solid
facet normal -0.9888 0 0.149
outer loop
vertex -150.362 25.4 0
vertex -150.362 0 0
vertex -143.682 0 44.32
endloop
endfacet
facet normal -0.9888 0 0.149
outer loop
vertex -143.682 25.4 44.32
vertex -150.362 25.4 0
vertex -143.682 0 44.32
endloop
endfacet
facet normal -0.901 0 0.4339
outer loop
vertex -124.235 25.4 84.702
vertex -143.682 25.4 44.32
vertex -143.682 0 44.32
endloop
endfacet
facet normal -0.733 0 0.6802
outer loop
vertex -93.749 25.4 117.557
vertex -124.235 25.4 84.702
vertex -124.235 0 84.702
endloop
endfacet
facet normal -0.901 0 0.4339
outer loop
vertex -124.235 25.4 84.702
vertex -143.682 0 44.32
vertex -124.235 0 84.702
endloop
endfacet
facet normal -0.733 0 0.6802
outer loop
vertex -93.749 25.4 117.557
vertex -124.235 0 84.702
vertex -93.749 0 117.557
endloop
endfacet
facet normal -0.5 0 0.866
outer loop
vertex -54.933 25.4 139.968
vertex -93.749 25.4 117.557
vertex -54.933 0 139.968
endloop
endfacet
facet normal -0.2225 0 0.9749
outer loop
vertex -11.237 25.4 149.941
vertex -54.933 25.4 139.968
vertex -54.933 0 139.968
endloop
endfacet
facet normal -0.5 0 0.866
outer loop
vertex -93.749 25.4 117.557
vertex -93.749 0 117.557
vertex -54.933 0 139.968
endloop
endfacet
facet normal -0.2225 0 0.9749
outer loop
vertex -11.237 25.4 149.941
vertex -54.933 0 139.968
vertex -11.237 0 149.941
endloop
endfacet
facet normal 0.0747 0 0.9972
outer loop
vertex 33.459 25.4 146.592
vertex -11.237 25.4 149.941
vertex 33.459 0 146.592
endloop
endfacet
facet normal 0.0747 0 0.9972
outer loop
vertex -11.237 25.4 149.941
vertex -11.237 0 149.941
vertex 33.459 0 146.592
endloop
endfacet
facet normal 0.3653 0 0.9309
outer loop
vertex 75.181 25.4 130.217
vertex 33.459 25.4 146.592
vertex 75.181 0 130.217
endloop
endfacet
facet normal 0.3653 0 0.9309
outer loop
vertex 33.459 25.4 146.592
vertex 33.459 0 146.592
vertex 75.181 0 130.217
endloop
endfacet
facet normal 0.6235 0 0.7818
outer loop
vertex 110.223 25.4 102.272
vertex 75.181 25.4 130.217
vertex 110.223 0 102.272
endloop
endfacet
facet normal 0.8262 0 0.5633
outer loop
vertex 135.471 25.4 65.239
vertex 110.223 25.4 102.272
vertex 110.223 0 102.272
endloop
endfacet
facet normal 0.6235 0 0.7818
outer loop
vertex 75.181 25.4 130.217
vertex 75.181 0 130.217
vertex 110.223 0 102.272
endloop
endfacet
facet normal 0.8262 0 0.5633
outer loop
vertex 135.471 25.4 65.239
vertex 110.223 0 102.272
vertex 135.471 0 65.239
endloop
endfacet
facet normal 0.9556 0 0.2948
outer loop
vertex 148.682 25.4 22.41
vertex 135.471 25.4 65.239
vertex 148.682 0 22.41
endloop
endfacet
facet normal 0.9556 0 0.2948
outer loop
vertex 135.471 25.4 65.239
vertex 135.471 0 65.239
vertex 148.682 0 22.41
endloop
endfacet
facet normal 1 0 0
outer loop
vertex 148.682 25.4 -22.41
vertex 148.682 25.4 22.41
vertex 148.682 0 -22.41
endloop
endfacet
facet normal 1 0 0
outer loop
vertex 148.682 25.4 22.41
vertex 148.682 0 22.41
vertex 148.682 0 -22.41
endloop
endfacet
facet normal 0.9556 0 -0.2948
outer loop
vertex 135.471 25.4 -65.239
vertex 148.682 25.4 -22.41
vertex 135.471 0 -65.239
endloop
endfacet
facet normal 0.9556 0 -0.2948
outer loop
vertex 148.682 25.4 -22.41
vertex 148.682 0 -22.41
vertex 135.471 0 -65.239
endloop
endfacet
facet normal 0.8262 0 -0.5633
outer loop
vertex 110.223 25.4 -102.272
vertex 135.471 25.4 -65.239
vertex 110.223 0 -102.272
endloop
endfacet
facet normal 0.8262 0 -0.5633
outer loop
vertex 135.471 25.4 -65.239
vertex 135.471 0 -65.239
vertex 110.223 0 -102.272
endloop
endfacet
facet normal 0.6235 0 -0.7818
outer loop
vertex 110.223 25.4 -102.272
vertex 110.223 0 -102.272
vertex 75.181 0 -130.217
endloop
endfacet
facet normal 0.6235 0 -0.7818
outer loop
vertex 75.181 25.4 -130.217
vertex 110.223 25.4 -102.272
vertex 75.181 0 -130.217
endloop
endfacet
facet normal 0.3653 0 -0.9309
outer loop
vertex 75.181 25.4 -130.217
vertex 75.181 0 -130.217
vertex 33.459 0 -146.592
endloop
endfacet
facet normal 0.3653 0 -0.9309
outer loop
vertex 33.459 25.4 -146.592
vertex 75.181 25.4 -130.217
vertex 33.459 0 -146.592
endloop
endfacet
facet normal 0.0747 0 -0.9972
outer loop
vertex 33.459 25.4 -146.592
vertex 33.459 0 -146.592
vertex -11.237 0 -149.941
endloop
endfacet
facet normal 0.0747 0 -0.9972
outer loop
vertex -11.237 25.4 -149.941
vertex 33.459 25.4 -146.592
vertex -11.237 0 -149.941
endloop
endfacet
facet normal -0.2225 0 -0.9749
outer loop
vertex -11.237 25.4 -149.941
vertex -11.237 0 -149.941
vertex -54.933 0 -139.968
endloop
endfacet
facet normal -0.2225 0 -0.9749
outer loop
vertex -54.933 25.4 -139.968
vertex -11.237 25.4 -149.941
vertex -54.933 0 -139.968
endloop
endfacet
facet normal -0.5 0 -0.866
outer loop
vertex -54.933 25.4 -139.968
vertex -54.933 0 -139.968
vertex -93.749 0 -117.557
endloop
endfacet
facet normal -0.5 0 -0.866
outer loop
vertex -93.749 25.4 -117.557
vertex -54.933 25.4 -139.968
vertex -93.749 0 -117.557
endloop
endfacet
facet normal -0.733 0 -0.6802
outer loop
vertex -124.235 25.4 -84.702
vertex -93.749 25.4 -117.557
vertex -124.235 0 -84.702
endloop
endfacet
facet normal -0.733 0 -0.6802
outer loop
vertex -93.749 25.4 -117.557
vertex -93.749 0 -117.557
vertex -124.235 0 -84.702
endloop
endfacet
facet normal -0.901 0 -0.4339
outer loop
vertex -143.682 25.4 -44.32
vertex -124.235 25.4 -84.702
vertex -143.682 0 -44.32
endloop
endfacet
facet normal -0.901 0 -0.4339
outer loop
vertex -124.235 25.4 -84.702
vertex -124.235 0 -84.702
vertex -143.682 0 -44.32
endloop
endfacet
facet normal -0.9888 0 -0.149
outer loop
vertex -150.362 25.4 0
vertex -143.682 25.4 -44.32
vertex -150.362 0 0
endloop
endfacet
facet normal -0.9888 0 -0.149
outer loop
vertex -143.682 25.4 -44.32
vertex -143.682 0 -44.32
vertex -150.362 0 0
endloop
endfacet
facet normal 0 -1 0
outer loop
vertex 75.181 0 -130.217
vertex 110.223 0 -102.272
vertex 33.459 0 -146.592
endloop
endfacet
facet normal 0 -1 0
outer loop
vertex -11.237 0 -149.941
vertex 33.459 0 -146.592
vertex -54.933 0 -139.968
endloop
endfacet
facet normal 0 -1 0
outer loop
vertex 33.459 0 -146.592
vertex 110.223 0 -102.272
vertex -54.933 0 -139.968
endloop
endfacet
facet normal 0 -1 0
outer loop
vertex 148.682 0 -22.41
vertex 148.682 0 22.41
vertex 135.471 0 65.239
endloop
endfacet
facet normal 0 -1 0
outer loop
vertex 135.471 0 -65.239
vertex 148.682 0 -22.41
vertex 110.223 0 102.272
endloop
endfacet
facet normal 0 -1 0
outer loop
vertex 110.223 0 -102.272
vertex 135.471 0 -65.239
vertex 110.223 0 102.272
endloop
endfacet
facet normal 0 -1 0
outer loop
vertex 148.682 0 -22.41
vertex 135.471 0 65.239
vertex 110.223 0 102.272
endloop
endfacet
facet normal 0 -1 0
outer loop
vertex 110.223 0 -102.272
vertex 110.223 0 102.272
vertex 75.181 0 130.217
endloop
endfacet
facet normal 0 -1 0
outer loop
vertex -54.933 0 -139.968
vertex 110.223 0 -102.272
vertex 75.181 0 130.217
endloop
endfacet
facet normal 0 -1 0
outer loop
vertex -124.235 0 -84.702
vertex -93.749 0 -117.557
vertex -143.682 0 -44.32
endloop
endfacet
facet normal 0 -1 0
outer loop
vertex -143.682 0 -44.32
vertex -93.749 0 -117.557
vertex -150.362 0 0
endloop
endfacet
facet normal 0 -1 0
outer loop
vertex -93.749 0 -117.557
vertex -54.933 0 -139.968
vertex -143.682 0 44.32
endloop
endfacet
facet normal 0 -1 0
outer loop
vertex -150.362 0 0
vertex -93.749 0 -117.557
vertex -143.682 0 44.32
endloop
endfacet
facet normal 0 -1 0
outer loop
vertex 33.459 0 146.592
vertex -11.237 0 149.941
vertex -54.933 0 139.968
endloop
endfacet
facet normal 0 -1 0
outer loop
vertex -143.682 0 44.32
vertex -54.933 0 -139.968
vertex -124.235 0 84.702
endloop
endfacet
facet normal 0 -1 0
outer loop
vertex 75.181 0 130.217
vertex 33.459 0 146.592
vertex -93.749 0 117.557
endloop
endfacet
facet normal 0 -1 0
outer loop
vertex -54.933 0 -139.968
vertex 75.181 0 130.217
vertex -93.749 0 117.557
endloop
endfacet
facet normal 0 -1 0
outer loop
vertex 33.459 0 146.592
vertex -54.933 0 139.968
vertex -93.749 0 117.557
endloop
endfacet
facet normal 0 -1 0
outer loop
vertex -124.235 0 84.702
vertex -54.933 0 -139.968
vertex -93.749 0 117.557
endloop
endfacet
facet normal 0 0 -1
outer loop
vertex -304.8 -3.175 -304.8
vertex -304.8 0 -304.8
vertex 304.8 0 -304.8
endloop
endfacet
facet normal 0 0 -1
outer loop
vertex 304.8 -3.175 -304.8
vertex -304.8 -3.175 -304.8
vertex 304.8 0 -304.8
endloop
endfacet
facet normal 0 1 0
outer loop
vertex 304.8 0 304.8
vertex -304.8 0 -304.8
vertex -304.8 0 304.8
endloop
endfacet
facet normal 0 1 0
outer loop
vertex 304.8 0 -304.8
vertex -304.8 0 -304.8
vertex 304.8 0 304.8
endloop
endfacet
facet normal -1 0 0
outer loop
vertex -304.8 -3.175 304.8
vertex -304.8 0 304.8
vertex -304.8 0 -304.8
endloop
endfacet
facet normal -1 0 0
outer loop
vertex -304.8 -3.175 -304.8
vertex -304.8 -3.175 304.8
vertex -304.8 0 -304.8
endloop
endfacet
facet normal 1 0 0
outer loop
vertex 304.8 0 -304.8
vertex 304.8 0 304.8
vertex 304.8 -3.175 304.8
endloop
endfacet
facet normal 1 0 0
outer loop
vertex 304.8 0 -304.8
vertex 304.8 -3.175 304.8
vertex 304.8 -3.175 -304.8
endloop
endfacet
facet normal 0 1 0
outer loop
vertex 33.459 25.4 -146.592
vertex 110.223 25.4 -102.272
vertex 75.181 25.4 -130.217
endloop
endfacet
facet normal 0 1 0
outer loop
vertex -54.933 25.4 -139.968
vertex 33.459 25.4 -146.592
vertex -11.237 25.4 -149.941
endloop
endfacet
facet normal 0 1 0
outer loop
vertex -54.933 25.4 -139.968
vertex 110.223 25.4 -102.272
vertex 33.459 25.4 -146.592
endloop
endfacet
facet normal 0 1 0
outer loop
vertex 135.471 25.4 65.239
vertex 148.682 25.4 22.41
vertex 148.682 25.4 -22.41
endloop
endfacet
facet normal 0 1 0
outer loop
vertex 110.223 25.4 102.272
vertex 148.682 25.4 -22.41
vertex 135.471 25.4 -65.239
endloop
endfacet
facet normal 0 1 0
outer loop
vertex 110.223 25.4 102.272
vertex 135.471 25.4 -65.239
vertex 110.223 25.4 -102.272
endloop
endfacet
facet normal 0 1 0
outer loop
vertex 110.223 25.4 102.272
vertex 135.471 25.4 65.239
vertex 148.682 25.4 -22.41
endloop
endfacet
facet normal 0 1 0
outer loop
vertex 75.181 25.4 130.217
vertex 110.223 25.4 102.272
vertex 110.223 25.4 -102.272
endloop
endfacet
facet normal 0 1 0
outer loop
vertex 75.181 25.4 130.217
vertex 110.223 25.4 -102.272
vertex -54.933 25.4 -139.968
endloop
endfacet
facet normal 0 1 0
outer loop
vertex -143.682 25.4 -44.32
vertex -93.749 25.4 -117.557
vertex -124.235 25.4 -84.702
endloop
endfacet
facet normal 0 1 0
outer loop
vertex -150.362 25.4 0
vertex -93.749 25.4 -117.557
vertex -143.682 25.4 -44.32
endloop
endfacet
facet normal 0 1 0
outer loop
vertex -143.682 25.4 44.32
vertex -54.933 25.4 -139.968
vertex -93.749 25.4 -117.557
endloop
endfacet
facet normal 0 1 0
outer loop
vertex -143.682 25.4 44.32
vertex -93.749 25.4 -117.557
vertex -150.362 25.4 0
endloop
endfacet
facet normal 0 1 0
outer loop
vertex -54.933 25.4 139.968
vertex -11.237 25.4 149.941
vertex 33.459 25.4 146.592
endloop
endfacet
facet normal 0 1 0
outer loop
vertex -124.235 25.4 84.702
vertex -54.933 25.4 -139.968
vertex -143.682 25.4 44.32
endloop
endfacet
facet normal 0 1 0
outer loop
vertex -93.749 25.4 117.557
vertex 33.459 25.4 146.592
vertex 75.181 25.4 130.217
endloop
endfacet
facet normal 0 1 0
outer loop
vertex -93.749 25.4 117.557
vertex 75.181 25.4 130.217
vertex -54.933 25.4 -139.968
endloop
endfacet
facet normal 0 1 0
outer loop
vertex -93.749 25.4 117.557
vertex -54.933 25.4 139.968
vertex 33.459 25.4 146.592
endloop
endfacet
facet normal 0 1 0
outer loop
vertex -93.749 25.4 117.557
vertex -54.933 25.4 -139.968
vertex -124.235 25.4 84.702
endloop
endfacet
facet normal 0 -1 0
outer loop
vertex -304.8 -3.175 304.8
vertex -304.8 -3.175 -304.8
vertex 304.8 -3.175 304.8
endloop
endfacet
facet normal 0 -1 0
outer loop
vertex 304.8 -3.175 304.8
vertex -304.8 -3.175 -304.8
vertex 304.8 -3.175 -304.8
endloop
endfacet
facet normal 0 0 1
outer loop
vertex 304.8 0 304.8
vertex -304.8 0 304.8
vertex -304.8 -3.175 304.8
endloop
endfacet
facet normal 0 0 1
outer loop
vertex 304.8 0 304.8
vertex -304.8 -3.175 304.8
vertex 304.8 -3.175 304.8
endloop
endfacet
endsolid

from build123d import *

# Parameters (mm, degrees)
SKETCH1_W      = 609.6
SKETCH1_H      = 609.6
EXTRUDE1_DEPTH = 3.175
SKETCH3_R      = 150.36165
EXTRUDE2_DEPTH = 25.4


with BuildPart() as part:
    # Sketch1 → Extrude1 (new body)
    with BuildSketch(Plane(origin=(0, 0, 0), x_dir=(1, 0, 0), z_dir=(0, 1, 0))):
        Rectangle(SKETCH1_W, SKETCH1_H)
    extrude(amount=-EXTRUDE1_DEPTH)


with BuildPart() as body_2:
    # sketch3 → Extrude2 (new body)
    with BuildSketch(Plane(origin=(0, 0, 0), x_dir=(-1, 0, 0), z_dir=(0, 1, 0))):
        Circle(SKETCH3_R)
    extrude(amount=EXTRUDE2_DEPTH)


solid = Compound([part.part, body_2.part])
